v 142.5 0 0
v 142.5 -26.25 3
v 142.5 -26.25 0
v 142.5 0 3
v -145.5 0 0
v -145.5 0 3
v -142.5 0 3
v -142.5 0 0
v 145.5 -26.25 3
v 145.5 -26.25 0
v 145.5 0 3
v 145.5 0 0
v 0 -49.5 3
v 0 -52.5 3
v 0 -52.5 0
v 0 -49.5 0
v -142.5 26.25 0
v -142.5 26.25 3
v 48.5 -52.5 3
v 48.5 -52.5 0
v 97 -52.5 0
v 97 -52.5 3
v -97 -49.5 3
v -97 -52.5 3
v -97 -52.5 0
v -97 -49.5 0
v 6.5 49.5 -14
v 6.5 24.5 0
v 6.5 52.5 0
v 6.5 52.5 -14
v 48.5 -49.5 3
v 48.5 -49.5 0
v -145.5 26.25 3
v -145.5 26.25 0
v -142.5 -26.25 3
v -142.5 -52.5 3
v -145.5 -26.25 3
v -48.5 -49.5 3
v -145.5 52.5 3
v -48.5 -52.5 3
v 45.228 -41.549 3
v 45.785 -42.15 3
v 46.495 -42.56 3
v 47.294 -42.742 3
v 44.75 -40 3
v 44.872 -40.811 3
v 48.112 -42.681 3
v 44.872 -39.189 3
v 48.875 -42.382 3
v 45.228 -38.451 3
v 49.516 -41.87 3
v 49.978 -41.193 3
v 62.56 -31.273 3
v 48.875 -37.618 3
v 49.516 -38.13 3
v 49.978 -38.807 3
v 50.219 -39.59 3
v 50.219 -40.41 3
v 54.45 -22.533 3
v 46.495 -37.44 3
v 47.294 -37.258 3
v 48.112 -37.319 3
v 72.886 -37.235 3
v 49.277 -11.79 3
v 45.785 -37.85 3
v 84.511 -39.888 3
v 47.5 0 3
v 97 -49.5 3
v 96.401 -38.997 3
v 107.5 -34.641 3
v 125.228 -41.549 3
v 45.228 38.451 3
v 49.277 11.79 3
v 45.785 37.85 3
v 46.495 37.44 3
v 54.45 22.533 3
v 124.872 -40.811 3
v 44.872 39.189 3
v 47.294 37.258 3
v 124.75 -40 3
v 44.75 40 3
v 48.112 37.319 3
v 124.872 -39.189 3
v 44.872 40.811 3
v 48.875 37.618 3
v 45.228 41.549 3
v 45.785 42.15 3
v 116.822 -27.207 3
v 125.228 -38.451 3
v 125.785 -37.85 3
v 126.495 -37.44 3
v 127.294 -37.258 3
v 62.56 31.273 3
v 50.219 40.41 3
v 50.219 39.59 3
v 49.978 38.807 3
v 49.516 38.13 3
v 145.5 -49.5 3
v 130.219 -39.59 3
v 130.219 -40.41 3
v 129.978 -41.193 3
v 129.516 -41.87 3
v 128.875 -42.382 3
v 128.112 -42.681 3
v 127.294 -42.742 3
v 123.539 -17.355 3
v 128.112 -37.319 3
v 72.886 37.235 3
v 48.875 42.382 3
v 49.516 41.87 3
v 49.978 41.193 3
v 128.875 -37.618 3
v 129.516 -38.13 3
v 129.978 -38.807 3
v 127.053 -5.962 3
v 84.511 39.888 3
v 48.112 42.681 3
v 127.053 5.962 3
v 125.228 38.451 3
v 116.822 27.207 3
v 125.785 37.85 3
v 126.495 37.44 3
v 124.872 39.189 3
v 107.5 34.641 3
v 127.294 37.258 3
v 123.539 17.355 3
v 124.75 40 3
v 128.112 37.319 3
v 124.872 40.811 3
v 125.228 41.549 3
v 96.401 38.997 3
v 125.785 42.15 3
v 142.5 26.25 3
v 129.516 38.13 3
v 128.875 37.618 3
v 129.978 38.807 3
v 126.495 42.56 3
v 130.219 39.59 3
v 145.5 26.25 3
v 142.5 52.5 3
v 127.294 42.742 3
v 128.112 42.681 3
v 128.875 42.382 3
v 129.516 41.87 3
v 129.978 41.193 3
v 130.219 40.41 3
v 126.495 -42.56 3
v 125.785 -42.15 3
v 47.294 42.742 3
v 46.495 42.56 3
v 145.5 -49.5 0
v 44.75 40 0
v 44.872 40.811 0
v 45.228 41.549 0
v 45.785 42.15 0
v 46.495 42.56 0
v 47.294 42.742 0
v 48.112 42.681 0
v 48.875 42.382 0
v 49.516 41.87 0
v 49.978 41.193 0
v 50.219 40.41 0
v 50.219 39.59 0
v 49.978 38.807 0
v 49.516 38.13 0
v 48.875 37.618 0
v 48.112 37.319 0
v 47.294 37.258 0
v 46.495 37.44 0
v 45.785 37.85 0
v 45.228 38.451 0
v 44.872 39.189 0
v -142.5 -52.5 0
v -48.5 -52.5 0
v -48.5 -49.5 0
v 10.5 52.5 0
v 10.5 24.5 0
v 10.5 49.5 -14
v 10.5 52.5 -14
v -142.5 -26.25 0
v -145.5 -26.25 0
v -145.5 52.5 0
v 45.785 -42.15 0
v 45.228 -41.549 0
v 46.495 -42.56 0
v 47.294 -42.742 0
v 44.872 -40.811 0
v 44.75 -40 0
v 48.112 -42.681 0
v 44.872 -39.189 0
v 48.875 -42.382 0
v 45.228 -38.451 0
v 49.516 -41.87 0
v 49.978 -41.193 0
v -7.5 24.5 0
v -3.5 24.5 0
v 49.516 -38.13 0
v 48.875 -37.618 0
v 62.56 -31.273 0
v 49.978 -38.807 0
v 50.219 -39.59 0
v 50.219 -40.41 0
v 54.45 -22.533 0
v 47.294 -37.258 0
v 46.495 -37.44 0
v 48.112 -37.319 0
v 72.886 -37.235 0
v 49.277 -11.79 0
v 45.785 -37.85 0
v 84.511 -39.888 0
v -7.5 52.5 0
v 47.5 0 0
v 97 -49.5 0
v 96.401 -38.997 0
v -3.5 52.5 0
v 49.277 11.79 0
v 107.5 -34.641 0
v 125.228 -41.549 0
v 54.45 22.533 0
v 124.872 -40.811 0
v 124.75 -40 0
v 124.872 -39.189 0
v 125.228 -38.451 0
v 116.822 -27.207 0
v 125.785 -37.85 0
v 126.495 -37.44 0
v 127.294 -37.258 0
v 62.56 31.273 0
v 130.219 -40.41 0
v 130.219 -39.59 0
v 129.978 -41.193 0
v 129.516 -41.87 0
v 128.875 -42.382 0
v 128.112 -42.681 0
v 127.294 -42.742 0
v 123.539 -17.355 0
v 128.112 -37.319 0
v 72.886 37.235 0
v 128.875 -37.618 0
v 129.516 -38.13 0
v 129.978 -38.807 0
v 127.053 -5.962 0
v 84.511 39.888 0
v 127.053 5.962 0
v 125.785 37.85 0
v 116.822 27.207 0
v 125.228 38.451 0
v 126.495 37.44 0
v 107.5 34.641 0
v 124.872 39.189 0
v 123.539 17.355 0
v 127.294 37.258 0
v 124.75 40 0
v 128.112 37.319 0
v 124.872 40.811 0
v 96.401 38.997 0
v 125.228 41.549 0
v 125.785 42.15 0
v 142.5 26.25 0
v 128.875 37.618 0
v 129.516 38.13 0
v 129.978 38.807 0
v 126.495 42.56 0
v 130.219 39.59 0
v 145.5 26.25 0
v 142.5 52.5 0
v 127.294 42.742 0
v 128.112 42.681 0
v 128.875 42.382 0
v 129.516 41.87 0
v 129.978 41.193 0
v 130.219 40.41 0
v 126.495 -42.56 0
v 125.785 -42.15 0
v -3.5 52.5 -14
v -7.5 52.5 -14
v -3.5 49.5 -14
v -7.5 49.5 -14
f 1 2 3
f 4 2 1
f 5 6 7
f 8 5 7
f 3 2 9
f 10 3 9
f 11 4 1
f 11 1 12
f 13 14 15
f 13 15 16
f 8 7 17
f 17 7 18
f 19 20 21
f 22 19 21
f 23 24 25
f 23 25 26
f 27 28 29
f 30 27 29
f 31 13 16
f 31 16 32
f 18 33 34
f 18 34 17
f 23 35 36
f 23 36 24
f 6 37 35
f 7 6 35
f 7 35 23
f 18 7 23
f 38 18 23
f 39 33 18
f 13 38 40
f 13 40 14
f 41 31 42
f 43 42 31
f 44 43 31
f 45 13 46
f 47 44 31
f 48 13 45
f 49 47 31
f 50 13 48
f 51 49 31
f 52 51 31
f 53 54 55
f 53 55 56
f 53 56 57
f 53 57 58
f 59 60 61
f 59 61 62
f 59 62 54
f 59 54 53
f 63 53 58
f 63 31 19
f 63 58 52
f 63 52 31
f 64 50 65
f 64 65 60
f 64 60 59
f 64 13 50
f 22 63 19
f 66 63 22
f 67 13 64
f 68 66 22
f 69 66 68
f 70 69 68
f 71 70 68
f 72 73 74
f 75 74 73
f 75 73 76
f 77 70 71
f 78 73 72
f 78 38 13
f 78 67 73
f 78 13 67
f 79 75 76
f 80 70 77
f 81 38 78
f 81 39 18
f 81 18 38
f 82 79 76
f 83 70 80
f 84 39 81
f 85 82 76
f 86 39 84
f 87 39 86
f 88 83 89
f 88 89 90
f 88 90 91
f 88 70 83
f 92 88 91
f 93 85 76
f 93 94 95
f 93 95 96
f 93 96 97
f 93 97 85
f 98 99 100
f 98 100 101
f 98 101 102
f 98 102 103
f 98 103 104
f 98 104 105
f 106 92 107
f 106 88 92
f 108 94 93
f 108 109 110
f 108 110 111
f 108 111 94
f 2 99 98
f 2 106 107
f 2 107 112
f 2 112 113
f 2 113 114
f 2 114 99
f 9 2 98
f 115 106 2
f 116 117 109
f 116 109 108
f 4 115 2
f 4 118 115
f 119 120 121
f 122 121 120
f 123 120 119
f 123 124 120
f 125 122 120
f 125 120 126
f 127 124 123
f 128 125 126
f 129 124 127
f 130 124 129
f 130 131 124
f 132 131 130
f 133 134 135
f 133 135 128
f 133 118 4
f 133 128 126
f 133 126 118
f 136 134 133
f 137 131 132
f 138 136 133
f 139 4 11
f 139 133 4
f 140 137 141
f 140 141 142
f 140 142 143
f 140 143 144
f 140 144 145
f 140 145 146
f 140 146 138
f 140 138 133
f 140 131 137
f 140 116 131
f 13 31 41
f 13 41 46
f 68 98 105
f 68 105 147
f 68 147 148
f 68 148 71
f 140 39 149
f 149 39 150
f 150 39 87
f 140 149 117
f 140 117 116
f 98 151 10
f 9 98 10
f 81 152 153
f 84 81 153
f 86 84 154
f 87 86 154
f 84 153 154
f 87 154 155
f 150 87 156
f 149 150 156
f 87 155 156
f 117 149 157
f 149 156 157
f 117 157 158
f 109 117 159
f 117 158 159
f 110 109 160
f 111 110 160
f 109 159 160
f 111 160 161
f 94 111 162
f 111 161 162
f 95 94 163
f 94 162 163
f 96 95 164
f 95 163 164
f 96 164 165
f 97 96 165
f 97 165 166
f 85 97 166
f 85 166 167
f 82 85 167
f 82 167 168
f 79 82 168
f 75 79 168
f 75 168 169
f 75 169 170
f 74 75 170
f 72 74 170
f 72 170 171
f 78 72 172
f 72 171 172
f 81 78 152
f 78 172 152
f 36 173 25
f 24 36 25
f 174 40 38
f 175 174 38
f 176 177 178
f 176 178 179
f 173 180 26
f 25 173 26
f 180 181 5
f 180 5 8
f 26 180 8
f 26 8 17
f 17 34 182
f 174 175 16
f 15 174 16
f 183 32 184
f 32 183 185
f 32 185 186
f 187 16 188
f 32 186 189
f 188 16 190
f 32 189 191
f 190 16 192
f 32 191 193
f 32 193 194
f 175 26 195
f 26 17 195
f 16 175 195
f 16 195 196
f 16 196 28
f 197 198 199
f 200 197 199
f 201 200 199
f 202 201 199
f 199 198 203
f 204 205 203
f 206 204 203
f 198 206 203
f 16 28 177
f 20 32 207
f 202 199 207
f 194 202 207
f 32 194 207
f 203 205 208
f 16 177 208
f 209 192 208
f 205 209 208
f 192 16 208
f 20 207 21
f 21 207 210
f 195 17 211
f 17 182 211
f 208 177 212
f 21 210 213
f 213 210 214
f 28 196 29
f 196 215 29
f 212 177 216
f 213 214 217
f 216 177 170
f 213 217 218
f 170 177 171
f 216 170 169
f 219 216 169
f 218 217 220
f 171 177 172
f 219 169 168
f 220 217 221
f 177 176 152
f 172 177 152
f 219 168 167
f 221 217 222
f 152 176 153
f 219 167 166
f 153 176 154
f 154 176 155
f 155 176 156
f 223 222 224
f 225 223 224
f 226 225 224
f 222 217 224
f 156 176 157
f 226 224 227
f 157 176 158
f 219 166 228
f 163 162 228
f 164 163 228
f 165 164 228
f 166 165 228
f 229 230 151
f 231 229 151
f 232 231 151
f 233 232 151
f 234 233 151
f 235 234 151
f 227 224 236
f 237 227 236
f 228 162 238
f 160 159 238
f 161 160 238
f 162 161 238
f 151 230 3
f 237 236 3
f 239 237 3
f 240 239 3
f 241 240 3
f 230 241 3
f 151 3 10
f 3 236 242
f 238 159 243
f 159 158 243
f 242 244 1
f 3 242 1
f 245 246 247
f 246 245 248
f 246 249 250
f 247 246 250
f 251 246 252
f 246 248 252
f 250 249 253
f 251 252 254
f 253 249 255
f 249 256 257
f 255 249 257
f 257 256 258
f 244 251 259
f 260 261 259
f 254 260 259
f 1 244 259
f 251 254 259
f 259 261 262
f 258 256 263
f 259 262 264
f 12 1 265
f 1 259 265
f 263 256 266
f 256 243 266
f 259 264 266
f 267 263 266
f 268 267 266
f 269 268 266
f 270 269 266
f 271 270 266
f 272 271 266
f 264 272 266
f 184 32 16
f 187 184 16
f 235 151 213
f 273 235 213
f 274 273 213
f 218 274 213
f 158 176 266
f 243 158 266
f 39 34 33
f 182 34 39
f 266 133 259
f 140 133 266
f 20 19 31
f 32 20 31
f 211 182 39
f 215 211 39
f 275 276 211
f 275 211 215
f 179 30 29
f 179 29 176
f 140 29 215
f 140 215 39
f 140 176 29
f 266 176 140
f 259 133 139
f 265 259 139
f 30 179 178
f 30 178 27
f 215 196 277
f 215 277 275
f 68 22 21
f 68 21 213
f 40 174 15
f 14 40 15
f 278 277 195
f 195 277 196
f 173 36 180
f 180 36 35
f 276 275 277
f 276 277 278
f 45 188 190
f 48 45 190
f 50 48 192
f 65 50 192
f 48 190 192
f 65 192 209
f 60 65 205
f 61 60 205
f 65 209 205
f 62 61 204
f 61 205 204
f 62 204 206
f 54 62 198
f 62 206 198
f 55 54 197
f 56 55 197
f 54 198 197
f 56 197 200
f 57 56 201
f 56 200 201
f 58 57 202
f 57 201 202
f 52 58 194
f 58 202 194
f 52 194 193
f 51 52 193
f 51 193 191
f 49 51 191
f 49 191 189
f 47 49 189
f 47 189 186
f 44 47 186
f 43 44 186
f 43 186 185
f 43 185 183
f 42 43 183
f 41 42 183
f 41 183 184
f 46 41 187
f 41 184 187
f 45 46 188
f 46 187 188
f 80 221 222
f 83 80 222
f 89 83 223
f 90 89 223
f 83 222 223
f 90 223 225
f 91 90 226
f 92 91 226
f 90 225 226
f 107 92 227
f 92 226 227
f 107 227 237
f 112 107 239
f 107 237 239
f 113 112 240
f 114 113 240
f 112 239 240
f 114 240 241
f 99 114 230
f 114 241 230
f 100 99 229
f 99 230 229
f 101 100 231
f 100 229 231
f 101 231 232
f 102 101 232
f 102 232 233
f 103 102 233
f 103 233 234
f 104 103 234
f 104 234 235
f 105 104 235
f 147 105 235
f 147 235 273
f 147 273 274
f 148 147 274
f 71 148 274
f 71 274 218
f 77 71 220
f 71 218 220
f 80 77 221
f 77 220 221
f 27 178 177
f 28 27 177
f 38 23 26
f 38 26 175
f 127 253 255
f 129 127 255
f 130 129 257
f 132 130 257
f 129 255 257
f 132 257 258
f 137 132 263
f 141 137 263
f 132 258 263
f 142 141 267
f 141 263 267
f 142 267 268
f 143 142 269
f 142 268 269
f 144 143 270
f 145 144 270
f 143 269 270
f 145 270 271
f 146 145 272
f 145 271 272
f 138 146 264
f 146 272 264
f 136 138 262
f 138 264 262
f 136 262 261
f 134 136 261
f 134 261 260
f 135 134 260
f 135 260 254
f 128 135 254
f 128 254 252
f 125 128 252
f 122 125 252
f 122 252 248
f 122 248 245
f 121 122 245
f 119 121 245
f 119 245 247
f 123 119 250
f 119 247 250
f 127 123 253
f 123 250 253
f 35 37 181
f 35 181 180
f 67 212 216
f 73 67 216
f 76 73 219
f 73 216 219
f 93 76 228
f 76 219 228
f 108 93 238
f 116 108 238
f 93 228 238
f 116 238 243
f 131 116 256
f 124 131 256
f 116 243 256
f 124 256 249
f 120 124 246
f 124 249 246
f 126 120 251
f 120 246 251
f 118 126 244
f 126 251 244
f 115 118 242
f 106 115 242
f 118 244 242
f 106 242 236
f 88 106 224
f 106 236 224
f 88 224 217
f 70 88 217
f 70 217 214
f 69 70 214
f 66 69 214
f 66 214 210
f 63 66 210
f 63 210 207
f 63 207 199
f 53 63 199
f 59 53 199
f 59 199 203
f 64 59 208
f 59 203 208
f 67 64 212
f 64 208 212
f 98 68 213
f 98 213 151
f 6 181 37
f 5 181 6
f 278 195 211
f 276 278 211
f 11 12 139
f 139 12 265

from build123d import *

# Parameters (mm, degrees)
SKETCH_1_W          = 291
SKETCH_1_H          = 105
EXTRUDE_1_DEPTH     = 3
SKETCH_2_W          = 3
SKETCH_2_H          = 26.25
SKETCH_2_W_2        = 48.5
SKETCH_2_H_2        = 3
CUT_EXTRUDE_1_DEPTH = 3
SKETCH_3_R          = 40
SKETCH_3_R_2        = 2.75
CUT_EXTRUDE_2_DEPTH = 3
SKETCH_4_W          = 4
SKETCH_4_H          = 28
EXTRUDE_2_DEPTH     = 14
CUT_EXTRUDE_3_REACH = 167.192


with BuildPart() as part:
    # Эскиз1 → Бобышка-Вытянуть1 (new body)
    with BuildSketch(Plane.XY):
        Rectangle(SKETCH_1_W, SKETCH_1_H)
    extrude(amount=EXTRUDE_1_DEPTH)

    # Эскиз2 → Вырез-Вытянуть1 (cut)
    with BuildSketch(Plane.XY.offset(3)):
        with Locations((-144, -39.375)):
            Rectangle(SKETCH_2_W, SKETCH_2_H)
        with Locations((-144, 13.125)):
            Rectangle(SKETCH_2_W, SKETCH_2_H)
        with Locations((-72.75, -51)):
            Rectangle(SKETCH_2_W_2, SKETCH_2_H_2)
        with Locations((24.25, -51)):
            Rectangle(SKETCH_2_W_2, SKETCH_2_H_2)
        with Locations((121.25, -51)):
            Rectangle(SKETCH_2_W_2, SKETCH_2_H_2)
        with Locations((144, 39.375)):
            Rectangle(SKETCH_2_W, SKETCH_2_H)
        with Locations((144, -13.125)):
            Rectangle(SKETCH_2_W, SKETCH_2_H)
    extrude(amount=-CUT_EXTRUDE_1_DEPTH, mode=Mode.SUBTRACT)

    # Эскиз3 → Вырез-Вытянуть2 (cut)
    with BuildSketch(Plane(origin=(0, 0, 0), x_dir=(-1, 0, 0), z_dir=(0, 0, -1))):
        with Locations((-87.5, 0)):
            Circle(SKETCH_3_R)
        with Locations((-127.5, 40)):
            Circle(SKETCH_3_R_2)
        with Locations((-47.5, 40)):
            Circle(SKETCH_3_R_2)
        with Locations((-47.5, -40)):
            Circle(SKETCH_3_R_2)
        with Locations((-127.5, -40)):
            Circle(SKETCH_3_R_2)
    extrude(amount=-CUT_EXTRUDE_2_DEPTH, mode=Mode.SUBTRACT)

    # Эскиз4 → Бобышка-Вытянуть2 (add)
    with BuildSketch(Plane(origin=(0, 0, 0), x_dir=(-1, 0, 0), z_dir=(0, 0, -1))):
        with Locations((5.5, 38.5)):
            Rectangle(SKETCH_4_W, SKETCH_4_H)
        with Locations((-8.5, 38.5)):
            Rectangle(SKETCH_4_W, SKETCH_4_H)
    extrude(amount=EXTRUDE_2_DEPTH)

    # Вырез-Вытянуть3: up to this face of the body (flat: up to its plane)
    cut_extrude_3_end = Plane(part.part.faces().sort_by_distance((-7.5, 38.5, -7))[0])
    # Эскиз5 → Вырез-Вытянуть3 (cut, up to the picked face)
    with BuildSketch(Plane(origin=(10.5, 0, 0), x_dir=(0, 0, -1), z_dir=(1, 0, 0)), mode=Mode.PRIVATE) as cut_extrude_3_sk1:
        Polygon((0, 24.5), (14, 24.5), (14, 49.5), align=None)
    cut_extrude_3_tool1 = split(extrude(cut_extrude_3_sk1.sketch, amount=-CUT_EXTRUDE_3_REACH, mode=Mode.PRIVATE), bisect_by=cut_extrude_3_end, keep=Keep.BOTH, mode=Mode.PRIVATE)
    add(cut_extrude_3_tool1.solids().sort_by(Axis((10.5, 32.833333, -9.333333), (-1, 0, 0)))[0], mode=Mode.SUBTRACT)


solid = part.part
